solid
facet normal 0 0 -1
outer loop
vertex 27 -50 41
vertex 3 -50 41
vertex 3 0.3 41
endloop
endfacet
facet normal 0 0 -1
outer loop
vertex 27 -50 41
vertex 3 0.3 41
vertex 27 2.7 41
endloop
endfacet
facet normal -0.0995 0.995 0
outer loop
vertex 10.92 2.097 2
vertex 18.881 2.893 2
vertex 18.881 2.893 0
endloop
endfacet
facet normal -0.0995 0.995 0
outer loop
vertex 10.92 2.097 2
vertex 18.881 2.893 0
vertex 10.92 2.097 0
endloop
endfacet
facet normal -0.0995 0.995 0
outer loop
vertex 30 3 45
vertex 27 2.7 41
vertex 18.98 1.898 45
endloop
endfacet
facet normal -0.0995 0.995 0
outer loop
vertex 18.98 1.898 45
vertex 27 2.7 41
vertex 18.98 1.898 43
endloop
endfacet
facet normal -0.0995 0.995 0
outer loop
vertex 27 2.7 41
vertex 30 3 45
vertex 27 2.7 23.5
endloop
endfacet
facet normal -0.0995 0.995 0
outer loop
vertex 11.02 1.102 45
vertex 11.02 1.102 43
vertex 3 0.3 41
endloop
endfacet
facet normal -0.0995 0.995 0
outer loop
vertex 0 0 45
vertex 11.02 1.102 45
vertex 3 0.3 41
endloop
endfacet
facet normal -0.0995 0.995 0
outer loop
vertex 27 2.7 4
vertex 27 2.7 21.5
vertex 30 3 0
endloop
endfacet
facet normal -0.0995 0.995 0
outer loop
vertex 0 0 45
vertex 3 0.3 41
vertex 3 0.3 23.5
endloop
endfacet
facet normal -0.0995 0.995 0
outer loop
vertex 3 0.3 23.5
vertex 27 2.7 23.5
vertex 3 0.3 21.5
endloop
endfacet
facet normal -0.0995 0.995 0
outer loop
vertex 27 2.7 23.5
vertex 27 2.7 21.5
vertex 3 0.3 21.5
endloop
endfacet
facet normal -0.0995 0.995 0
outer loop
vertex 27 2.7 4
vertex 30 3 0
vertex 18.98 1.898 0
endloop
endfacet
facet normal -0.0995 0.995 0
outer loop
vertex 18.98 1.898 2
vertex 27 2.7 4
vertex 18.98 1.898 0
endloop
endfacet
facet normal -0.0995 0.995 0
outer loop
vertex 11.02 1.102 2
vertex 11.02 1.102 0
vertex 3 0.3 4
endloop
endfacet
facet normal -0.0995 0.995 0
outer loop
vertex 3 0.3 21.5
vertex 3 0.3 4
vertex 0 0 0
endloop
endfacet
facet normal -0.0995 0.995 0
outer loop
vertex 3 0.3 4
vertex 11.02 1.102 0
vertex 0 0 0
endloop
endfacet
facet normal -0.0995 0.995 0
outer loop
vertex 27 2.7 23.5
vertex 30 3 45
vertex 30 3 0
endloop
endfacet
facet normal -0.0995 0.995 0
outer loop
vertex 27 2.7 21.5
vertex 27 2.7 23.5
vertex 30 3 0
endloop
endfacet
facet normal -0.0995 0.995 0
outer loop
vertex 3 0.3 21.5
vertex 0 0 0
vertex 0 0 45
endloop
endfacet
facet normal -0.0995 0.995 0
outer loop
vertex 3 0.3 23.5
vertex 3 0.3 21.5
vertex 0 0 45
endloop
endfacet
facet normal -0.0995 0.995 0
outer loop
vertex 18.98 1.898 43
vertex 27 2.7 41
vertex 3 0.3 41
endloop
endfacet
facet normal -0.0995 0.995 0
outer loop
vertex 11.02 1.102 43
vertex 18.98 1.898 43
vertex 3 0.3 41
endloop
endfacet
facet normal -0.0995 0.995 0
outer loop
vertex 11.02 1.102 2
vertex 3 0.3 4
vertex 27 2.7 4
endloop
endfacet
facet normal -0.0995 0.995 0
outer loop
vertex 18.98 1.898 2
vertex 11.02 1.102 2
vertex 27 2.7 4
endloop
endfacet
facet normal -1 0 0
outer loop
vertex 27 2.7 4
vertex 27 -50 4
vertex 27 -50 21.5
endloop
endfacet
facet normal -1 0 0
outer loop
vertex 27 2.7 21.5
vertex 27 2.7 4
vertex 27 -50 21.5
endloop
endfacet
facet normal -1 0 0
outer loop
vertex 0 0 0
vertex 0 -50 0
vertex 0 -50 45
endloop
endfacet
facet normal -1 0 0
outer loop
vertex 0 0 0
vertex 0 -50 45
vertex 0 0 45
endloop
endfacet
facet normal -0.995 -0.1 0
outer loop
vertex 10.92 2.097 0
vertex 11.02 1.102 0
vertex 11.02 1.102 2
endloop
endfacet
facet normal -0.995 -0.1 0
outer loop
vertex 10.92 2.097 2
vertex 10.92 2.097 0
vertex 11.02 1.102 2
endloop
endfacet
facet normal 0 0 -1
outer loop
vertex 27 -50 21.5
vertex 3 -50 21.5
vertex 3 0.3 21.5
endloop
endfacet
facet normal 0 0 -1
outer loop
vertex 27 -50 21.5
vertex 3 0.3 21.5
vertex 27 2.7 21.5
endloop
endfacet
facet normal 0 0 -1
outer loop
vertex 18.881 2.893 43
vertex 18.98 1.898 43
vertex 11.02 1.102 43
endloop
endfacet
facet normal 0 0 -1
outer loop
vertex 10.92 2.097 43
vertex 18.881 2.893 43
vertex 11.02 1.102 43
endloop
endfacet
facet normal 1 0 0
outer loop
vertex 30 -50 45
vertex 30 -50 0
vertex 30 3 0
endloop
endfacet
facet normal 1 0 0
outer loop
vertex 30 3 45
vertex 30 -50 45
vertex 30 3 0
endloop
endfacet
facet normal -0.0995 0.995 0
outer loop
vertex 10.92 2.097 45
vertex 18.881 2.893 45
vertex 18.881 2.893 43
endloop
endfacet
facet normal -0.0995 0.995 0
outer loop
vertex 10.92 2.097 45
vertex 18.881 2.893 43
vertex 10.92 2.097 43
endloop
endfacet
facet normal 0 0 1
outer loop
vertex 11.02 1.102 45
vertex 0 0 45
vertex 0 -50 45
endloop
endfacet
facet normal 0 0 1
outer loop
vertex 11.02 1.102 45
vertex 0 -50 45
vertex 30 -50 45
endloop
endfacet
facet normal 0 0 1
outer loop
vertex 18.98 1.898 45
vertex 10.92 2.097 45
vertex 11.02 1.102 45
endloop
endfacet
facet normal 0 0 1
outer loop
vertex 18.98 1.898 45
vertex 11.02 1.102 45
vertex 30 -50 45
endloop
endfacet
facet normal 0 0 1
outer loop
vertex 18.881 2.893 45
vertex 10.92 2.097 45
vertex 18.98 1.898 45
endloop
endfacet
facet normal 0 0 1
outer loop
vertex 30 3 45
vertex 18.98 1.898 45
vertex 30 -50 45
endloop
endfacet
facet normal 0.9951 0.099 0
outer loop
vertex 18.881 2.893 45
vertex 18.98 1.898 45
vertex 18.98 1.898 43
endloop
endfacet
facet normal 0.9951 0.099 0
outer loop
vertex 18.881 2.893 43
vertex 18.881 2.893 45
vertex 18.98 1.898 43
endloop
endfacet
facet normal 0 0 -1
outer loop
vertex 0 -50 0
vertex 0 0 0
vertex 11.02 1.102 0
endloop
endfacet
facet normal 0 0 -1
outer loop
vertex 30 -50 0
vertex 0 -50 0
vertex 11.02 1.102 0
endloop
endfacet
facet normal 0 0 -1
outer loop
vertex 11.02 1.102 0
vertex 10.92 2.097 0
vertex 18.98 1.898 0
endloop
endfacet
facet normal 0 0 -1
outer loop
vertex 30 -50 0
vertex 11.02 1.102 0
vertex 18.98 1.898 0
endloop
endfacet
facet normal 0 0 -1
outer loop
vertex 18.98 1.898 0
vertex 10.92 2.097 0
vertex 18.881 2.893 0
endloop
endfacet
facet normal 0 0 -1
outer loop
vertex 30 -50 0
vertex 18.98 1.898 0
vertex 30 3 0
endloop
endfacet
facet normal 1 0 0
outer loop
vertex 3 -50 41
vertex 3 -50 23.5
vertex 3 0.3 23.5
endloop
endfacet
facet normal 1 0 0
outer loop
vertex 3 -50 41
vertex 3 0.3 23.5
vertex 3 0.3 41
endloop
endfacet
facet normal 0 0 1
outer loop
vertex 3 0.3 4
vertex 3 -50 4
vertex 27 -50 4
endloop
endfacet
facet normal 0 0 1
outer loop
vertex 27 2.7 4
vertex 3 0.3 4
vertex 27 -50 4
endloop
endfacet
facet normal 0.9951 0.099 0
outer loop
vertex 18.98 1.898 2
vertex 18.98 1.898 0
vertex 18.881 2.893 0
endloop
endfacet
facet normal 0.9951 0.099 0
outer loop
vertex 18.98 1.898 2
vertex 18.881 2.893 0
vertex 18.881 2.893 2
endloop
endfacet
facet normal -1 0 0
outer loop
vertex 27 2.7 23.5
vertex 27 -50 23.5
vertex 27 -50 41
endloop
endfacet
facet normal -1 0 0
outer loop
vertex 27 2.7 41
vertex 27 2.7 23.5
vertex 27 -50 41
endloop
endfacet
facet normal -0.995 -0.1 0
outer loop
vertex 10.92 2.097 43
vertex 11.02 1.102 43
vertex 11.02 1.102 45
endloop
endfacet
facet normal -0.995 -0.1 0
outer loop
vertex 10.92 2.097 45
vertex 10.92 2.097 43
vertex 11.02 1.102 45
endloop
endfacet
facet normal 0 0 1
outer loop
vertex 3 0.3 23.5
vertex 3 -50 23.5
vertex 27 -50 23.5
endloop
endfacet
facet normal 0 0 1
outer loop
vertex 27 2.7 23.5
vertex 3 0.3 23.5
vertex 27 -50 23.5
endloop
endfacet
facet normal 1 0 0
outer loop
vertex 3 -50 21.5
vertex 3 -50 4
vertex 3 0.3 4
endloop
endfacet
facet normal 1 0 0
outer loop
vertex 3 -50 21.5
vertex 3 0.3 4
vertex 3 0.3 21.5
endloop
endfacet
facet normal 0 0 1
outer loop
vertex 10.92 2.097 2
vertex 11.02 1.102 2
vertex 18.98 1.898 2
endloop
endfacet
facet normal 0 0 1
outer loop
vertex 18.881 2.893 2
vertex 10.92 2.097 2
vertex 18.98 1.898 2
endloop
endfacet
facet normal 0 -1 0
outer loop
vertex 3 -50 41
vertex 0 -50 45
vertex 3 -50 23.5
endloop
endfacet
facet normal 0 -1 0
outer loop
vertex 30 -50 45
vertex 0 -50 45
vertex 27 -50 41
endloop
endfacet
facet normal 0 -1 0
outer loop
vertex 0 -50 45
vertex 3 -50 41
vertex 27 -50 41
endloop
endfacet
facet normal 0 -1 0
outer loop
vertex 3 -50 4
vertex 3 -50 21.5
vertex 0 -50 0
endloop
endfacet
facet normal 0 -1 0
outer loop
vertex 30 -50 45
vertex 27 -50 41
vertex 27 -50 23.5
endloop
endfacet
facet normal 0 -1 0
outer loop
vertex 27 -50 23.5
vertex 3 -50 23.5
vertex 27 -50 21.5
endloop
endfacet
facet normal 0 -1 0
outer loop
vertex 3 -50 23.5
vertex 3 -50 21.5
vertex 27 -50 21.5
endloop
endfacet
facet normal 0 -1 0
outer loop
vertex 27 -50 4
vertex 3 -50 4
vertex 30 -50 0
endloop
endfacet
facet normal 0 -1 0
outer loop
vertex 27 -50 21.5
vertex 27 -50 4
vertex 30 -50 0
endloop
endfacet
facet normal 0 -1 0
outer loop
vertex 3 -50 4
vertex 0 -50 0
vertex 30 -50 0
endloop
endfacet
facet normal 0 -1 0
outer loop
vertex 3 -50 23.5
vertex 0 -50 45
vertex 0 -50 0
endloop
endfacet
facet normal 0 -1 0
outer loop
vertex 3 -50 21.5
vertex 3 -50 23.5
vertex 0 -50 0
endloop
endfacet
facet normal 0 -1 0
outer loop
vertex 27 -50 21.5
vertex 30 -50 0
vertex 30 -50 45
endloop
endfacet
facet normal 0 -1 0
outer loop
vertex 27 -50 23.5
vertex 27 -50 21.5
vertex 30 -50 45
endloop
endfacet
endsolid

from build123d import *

# Parameters (mm, degrees)
F1_W     = 30
F1_H     = 50
F2_DEPTH = 45
F3_W     = 4
F3_H     = 2
F4_DEPTH = 1
F5_W     = 24
F5_H     = 17.5
F6_DEPTH = 53.0006863286


with BuildPart() as f2:
    # F1 (on Top) → F2 (new body)
    with BuildSketch(Plane.XY):
        Polygon((30, 2.9996863286), (0, 0), (30, 0), align=None)
        with Locations((15, -25)):
            Rectangle(F1_W, F1_H)
    extrude(amount=F2_DEPTH)

    # F3 (on face) → F4 (join)
    with BuildSketch(Plane(origin=(0, 0, 0), x_dir=(-0.9950382202, -0.0994934182, 0), z_dir=(-0.0994934182, 0.9950382202, 0))):
        with Locations((-13.0747978268, 1)):
            Rectangle(F3_W, F3_H)
        with Locations((-17.0747978268, 1)):
            Rectangle(F3_W, F3_H)
        Polygon((-11.0747978268, 45), (-15.0747978268, 45), (-19.0747978268, 45), (-19.0747978268, 43), (-15.0747978268, 43), (-11.0747978268, 43), align=None)
    extrude(amount=F4_DEPTH)

    # F5 (on face) → F6 (cut, through all)
    with BuildSketch(Plane.XZ.offset(50)):
        with Locations((15, 12.75)):
            Rectangle(F5_W, F5_H)
        with Locations((15, 32.25)):
            Rectangle(F5_W, F5_H)
    extrude(amount=-F6_DEPTH, mode=Mode.SUBTRACT)


solid = f2.part
